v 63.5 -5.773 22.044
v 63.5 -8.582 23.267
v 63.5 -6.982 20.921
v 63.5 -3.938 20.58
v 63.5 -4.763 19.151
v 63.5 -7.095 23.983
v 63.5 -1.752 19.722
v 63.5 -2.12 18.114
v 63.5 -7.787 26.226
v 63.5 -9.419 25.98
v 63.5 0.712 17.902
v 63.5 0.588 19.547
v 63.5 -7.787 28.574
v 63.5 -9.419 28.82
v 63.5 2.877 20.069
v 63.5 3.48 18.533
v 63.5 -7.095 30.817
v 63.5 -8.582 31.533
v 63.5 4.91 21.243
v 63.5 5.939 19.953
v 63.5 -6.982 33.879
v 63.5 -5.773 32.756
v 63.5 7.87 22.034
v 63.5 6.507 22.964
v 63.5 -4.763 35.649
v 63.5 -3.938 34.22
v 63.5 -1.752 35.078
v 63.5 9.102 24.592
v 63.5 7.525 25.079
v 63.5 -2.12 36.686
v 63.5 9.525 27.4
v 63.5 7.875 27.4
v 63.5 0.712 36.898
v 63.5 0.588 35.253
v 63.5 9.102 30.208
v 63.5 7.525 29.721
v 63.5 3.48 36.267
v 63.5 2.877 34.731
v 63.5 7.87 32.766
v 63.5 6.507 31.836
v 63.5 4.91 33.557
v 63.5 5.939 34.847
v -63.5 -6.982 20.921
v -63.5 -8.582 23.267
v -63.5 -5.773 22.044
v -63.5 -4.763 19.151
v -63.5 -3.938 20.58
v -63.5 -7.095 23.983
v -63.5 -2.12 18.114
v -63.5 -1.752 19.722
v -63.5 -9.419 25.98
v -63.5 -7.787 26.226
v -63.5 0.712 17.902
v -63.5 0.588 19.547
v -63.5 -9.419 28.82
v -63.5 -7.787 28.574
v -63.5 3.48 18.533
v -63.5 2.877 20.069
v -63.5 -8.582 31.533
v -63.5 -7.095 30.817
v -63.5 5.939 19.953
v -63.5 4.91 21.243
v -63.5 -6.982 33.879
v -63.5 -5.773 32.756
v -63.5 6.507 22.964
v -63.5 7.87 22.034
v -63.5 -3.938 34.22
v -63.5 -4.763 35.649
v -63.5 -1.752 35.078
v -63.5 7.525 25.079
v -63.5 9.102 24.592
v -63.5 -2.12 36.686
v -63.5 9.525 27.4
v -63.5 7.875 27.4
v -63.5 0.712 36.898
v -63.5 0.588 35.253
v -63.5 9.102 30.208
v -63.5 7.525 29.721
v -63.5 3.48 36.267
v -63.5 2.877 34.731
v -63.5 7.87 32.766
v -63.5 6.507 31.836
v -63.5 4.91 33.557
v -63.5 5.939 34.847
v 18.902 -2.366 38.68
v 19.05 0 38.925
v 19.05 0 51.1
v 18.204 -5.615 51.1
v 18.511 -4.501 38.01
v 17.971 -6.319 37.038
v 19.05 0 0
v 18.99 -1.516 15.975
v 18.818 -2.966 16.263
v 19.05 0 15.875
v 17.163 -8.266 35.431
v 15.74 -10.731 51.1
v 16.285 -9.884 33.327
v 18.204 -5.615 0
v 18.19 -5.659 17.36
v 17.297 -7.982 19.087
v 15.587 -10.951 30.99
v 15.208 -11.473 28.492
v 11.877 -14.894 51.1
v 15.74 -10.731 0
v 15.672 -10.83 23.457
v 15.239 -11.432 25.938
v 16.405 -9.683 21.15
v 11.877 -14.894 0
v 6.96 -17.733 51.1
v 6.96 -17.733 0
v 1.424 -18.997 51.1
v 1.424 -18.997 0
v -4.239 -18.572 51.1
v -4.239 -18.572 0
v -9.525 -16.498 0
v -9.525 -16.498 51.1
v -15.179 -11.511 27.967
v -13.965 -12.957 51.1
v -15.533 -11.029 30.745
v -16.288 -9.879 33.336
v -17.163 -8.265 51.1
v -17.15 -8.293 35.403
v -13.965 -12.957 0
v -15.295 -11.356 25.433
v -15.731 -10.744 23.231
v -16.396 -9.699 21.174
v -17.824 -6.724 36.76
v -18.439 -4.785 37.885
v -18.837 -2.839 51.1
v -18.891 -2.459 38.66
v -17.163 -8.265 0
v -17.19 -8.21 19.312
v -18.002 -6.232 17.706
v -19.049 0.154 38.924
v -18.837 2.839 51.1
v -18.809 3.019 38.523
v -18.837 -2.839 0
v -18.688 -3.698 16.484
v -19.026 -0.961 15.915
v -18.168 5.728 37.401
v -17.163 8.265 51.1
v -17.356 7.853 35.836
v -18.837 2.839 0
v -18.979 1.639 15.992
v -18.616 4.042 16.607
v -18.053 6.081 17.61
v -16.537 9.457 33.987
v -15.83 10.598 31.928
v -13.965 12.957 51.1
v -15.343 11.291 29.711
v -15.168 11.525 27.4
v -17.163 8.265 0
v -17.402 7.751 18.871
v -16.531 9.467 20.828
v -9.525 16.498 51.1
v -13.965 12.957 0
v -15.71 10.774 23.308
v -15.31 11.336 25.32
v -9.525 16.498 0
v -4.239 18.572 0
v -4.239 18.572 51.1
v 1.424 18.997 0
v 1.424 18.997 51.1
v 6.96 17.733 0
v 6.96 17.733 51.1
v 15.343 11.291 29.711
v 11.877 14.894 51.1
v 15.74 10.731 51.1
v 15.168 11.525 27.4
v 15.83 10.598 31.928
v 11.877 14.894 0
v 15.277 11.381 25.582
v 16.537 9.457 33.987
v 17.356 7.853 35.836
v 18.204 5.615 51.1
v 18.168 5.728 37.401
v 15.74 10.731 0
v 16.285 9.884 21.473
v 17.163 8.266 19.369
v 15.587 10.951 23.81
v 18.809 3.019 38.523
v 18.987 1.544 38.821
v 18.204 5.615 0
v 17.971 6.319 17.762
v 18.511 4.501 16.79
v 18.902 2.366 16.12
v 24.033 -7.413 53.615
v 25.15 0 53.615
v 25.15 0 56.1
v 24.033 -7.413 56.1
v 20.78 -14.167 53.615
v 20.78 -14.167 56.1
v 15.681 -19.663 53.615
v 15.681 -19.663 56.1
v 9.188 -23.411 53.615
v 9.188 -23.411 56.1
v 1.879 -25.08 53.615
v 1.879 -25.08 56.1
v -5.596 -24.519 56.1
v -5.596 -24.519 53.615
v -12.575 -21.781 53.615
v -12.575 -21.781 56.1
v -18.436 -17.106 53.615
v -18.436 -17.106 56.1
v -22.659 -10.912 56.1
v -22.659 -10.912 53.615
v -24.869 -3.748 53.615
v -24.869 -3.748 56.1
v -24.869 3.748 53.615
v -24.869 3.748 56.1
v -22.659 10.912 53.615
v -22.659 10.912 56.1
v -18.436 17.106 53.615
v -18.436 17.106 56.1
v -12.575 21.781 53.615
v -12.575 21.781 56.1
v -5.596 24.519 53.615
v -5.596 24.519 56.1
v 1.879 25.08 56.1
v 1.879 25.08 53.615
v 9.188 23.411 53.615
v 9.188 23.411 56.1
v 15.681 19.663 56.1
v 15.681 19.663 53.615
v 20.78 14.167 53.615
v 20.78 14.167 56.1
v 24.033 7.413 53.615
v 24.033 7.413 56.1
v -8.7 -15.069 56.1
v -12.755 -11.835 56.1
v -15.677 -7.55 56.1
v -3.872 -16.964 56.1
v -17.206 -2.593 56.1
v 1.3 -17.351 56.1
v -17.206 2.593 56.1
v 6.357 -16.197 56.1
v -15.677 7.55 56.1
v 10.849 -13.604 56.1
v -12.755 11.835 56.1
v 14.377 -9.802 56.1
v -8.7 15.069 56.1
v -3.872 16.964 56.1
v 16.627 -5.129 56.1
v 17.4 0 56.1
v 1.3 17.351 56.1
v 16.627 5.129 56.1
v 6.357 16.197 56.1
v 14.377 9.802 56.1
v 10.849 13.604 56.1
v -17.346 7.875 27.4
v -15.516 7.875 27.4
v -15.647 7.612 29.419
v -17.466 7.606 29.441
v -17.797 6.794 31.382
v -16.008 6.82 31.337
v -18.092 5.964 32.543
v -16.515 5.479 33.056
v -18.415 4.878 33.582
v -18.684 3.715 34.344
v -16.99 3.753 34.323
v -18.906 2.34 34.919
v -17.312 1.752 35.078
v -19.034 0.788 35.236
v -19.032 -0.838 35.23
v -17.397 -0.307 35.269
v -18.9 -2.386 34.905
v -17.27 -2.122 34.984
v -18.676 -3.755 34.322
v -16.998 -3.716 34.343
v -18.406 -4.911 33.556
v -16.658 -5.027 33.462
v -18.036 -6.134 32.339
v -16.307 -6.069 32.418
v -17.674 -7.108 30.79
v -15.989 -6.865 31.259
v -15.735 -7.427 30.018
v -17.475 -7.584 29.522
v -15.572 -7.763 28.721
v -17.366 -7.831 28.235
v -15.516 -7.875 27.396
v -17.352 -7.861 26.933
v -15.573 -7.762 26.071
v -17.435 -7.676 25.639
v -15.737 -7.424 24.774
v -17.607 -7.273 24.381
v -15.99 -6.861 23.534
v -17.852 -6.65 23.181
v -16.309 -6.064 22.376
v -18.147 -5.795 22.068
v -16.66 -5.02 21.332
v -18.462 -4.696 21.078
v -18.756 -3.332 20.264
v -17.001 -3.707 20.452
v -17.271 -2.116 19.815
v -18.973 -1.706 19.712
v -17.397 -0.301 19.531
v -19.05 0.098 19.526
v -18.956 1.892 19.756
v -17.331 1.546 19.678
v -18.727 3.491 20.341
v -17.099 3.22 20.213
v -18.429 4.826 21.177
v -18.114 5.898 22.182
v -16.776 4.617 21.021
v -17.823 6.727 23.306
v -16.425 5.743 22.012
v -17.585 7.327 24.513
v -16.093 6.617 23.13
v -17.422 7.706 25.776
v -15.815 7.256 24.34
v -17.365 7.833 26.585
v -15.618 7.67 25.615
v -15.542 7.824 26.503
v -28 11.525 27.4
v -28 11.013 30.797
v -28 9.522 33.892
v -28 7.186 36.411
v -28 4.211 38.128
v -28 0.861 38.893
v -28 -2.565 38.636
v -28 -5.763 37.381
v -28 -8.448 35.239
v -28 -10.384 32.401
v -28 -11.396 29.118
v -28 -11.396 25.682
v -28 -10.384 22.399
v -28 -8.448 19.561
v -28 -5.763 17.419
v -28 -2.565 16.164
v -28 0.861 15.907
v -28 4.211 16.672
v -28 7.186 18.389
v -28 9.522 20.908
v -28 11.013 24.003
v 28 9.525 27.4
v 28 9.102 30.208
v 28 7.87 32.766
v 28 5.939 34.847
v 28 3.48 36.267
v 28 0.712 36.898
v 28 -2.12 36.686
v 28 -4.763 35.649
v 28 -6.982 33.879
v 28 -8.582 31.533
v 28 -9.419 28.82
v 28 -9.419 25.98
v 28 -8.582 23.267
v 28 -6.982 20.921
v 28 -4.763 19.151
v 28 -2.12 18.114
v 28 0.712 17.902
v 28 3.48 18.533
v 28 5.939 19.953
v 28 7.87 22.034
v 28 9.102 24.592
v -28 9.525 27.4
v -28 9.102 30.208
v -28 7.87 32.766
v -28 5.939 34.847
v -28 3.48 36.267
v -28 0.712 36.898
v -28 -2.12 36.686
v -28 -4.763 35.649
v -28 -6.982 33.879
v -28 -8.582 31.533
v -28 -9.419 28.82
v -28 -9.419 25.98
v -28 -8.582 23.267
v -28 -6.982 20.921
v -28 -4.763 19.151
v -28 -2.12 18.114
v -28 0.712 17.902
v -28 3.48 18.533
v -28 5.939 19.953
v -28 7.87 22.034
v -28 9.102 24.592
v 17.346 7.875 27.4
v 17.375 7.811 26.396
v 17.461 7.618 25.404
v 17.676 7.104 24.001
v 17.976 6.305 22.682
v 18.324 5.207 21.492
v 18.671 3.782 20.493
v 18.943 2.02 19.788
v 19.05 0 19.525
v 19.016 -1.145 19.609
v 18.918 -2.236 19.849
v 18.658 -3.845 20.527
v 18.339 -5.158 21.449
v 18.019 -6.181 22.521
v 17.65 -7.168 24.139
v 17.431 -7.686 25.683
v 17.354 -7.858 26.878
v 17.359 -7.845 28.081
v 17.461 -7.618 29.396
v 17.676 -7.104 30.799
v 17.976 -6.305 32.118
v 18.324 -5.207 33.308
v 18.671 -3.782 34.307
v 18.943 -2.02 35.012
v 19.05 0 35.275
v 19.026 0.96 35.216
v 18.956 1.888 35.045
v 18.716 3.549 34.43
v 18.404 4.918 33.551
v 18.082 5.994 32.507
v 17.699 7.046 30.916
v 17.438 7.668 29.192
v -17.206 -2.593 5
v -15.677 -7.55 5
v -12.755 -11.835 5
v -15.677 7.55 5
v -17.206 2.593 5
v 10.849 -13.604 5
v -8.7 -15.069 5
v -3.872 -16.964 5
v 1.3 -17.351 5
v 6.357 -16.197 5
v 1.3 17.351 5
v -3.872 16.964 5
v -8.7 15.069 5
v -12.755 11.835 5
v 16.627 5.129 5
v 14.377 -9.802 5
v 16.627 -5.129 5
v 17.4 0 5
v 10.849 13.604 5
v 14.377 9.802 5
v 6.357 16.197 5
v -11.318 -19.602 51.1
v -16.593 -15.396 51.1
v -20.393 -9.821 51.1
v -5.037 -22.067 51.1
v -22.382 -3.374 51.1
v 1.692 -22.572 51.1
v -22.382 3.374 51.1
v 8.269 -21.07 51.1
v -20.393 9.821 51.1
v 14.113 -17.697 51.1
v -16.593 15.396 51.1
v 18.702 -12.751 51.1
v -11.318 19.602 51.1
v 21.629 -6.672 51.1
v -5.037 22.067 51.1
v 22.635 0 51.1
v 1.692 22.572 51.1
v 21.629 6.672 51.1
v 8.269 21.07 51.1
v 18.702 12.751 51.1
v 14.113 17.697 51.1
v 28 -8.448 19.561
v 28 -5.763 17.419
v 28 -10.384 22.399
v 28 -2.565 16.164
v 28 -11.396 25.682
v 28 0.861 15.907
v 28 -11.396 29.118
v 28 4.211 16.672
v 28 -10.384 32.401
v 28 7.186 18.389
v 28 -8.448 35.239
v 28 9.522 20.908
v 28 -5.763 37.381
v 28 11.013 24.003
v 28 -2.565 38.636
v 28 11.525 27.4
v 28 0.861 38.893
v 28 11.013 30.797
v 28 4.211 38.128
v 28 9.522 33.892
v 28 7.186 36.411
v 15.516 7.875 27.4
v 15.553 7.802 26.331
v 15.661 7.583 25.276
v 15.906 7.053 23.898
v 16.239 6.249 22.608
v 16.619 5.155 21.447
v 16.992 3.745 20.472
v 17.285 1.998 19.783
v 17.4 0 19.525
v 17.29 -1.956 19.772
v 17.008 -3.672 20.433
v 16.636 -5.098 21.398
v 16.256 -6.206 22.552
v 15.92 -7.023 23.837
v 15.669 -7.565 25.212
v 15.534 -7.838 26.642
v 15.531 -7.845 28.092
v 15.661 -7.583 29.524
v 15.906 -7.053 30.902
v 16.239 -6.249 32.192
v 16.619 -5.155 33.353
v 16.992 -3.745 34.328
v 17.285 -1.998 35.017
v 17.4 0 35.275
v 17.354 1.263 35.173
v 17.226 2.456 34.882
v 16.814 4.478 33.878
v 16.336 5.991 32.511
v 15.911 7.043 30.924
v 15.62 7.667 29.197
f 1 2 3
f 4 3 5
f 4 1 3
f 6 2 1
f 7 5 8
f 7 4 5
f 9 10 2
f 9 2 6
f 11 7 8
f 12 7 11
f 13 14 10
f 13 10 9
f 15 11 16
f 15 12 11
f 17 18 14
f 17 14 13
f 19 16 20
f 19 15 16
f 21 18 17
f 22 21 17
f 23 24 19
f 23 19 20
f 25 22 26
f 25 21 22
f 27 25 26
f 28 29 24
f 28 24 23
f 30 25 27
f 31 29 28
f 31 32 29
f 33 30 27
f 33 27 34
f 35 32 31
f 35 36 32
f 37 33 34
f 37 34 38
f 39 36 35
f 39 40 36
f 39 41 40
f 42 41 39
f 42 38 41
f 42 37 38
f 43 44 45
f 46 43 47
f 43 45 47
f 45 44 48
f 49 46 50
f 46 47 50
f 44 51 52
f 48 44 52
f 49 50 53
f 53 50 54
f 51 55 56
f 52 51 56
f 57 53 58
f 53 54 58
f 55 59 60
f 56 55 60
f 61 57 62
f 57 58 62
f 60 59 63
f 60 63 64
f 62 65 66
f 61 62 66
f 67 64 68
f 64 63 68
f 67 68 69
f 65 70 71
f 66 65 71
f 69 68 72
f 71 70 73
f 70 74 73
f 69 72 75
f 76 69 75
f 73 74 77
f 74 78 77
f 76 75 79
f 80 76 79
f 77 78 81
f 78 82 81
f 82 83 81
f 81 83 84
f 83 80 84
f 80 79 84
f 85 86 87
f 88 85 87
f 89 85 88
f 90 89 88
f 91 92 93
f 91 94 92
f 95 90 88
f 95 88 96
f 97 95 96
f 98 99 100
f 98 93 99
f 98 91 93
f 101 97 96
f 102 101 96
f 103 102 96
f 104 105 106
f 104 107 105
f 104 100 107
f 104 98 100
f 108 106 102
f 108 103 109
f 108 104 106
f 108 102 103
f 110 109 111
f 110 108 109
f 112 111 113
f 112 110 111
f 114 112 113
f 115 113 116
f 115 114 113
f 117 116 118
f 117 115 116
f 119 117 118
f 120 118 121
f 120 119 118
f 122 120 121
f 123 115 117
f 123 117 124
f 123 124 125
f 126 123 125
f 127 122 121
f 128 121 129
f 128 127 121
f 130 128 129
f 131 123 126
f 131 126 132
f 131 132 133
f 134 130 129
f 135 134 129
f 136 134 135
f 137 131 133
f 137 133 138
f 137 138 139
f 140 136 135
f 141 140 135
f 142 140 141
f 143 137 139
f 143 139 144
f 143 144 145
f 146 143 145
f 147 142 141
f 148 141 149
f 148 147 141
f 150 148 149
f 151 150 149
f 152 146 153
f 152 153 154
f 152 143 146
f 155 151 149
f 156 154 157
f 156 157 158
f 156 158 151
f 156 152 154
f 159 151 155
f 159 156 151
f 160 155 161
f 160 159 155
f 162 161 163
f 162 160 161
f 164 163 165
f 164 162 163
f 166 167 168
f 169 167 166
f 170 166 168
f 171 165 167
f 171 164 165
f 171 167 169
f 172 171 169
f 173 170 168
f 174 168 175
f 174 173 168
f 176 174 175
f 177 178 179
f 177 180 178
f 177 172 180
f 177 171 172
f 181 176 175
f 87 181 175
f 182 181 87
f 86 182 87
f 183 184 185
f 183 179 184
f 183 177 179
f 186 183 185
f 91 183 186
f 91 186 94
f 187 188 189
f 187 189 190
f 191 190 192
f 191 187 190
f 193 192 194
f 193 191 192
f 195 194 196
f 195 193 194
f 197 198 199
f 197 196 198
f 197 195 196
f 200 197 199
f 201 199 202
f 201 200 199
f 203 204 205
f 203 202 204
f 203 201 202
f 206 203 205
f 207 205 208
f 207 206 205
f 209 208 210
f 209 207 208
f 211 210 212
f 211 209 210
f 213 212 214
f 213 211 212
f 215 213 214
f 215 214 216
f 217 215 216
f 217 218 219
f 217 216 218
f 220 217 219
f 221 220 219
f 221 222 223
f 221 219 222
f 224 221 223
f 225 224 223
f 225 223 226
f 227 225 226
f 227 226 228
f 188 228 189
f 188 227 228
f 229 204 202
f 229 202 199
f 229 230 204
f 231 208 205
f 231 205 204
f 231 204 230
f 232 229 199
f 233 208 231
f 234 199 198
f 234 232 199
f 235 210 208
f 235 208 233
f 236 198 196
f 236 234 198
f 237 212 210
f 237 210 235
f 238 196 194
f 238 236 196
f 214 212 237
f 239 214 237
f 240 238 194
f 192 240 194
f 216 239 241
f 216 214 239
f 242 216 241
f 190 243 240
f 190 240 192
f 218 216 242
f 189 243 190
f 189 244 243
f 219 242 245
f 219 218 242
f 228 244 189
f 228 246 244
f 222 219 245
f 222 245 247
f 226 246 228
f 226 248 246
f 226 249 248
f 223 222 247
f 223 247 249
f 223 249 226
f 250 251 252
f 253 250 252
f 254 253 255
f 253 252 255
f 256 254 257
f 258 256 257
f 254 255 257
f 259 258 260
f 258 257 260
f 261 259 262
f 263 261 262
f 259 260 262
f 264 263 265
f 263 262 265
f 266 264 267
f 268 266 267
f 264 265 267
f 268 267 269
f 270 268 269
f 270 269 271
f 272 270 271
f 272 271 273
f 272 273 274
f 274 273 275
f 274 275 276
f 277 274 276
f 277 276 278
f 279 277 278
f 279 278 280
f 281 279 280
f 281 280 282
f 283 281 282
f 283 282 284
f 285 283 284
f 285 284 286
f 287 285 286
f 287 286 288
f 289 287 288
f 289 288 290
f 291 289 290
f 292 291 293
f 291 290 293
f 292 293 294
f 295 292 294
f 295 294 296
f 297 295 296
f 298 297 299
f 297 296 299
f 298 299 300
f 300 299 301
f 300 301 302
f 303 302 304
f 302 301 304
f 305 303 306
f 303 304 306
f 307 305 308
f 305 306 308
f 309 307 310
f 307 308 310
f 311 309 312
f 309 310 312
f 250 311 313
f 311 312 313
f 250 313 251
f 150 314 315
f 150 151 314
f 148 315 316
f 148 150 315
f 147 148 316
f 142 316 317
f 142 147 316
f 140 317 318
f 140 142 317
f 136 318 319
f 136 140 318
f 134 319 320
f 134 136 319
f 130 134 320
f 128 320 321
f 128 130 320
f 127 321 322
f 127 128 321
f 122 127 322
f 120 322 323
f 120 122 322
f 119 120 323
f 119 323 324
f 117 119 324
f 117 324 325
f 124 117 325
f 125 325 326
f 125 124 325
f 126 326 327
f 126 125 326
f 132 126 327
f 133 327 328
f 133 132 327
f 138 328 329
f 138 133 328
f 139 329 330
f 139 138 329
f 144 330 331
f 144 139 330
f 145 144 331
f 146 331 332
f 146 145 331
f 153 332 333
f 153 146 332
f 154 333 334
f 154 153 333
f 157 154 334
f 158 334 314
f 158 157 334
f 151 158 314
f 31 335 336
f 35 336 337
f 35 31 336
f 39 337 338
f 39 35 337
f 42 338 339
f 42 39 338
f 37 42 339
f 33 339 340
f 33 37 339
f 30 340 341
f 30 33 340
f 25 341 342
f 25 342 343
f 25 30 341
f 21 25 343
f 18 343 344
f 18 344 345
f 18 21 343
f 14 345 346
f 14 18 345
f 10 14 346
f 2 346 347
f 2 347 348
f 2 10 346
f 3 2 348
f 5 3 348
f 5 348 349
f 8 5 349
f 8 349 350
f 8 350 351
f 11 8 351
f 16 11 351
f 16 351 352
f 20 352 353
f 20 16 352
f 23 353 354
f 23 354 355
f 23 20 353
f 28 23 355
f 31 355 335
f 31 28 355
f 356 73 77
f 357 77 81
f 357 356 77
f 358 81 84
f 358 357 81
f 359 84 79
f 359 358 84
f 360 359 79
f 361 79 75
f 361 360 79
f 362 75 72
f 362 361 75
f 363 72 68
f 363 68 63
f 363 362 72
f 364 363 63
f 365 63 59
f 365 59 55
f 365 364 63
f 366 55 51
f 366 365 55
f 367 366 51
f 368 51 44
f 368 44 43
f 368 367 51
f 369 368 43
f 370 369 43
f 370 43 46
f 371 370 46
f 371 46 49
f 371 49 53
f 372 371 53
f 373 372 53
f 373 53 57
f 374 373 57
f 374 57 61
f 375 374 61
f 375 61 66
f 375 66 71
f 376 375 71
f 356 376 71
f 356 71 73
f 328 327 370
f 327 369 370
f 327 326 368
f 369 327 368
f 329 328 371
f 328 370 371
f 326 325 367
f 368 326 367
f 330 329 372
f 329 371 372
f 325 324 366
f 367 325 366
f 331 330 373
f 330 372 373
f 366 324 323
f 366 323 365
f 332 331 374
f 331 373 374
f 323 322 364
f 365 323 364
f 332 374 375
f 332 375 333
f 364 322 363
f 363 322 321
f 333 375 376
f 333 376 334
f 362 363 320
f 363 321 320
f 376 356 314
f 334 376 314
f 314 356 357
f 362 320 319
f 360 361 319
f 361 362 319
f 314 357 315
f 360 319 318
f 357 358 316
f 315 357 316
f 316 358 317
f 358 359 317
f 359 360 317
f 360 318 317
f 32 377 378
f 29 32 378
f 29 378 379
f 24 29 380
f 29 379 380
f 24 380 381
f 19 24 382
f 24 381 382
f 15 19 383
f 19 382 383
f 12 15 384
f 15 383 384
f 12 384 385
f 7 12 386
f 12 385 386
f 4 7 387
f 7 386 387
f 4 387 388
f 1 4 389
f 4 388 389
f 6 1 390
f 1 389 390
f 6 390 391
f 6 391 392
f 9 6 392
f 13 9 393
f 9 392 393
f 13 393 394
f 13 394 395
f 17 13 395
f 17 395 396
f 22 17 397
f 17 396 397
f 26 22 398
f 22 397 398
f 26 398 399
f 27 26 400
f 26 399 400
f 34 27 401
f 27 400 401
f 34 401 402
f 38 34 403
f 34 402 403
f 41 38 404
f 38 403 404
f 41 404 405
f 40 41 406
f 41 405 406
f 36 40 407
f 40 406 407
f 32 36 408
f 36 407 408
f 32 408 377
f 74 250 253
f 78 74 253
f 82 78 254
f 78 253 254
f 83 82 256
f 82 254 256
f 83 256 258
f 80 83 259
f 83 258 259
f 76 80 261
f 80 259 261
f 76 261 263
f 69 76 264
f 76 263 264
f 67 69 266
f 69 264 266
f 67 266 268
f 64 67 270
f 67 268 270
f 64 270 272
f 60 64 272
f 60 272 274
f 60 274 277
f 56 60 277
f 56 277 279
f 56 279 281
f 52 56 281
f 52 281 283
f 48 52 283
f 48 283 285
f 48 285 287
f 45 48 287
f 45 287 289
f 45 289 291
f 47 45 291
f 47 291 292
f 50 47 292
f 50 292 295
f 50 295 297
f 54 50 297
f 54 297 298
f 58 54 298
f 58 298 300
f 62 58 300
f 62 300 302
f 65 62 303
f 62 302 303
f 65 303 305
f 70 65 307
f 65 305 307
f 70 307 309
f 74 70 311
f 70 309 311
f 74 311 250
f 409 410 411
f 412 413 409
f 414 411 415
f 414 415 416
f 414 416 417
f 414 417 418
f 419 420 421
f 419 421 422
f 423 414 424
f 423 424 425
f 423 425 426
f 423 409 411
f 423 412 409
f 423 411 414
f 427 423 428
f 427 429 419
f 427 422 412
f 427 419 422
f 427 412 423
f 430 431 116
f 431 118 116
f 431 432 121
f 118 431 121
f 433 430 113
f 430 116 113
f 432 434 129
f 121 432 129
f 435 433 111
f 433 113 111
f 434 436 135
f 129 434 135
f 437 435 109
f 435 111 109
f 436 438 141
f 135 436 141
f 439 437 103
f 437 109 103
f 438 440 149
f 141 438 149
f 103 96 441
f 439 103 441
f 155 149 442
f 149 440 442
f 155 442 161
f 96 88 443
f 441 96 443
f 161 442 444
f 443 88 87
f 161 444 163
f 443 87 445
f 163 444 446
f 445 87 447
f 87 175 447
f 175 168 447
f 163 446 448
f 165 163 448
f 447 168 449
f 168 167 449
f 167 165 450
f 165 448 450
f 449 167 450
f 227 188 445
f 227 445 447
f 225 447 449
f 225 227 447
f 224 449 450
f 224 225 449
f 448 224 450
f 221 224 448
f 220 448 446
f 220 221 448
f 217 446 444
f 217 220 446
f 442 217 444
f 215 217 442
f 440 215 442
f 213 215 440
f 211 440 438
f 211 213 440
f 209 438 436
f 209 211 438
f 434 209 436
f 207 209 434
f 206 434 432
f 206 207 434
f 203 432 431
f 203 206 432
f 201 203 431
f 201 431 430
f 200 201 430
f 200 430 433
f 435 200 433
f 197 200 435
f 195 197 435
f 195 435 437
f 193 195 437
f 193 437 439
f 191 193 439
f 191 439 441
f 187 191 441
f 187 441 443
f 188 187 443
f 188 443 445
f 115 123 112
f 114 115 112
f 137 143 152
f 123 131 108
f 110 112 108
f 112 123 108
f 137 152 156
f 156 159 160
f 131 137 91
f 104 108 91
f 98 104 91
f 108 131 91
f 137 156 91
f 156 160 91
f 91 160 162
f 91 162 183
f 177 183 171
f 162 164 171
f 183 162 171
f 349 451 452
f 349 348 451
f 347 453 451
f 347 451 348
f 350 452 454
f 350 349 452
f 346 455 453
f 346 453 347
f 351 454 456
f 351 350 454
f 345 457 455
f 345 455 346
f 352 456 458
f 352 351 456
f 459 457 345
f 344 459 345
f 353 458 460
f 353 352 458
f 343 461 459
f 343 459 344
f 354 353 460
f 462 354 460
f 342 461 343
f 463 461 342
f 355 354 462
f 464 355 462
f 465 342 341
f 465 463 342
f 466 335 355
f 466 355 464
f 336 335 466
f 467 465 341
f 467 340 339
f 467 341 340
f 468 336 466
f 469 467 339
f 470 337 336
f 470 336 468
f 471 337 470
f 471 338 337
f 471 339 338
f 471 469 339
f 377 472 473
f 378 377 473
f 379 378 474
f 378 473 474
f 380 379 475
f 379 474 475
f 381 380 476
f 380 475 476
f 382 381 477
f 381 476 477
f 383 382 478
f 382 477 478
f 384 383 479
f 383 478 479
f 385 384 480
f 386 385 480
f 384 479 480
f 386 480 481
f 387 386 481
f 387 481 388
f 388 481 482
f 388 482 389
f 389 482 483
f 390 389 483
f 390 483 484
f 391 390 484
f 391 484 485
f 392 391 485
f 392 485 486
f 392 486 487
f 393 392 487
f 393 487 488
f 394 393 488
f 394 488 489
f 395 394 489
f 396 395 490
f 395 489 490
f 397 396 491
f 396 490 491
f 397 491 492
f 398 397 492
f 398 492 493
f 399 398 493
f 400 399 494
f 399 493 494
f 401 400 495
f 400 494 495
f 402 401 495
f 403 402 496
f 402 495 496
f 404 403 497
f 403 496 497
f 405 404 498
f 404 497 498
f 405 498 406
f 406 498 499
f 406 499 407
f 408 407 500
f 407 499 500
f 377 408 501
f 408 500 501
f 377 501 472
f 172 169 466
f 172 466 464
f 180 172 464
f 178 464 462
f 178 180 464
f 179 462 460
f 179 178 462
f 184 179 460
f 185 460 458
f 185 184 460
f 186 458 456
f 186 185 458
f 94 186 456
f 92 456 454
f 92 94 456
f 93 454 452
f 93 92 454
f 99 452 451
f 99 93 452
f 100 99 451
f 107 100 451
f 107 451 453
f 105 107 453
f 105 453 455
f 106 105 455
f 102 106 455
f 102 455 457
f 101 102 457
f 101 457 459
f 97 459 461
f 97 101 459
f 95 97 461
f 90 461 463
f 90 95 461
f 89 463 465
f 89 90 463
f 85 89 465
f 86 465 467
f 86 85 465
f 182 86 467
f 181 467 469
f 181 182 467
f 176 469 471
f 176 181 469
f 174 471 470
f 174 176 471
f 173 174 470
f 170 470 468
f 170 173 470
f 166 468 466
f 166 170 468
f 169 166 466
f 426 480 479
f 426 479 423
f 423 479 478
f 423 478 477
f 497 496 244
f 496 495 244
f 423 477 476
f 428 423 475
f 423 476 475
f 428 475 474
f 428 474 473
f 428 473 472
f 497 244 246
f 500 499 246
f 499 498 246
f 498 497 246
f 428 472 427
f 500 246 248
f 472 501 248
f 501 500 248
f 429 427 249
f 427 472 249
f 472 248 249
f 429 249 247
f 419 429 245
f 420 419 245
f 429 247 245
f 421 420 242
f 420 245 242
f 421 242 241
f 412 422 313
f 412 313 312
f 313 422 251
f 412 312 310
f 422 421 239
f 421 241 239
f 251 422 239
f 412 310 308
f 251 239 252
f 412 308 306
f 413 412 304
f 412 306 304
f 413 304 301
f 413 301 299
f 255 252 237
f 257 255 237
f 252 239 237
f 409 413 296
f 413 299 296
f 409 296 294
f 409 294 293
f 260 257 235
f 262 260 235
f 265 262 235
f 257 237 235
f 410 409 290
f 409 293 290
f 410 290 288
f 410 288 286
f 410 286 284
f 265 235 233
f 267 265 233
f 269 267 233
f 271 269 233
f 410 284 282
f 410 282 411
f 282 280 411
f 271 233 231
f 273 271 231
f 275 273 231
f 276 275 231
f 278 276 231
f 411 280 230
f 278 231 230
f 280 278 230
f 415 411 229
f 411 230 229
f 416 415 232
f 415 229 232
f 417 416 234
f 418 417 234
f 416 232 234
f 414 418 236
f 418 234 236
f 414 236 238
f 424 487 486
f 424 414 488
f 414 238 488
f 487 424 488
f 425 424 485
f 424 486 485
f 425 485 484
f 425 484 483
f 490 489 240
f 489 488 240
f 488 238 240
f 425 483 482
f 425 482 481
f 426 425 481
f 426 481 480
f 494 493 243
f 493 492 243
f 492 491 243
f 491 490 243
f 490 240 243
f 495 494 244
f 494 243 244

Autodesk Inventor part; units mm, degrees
ref_plane "YZ Plane" through (0, 0, 0) normal (1, 0, 0) x (0, 1, 0)
ref_plane "XZ Plane" through (0, 0, 0) normal (0, 1, 0) x (-1, 0, 0)
ref_plane "XY Plane" through (0, 0, 0) normal (0, 0, 1) x (1, 0, 0)
sketch "Sketch1" plane through (0, 0, 0) normal (0, 0, 1) x (1, 0, 0)
  circle A0 centre (0, 0) radius 19.05
  dimension "d0" = 38.1
extrude "Extrusion1" add sketch "Sketch1" along normal blind 51.1
sketch "Sketch6" plane through (0, 0, 0) normal (1, 0, 0) x (0, 1, 0)
  line L0 (0, 0) -> (0, 27.4) construction
  circle A0 centre (0, 27.4) radius 9.525
  circle A1 centre (0, 27.4) radius 7.875
  dimension "d22" = 27.4
  dimension "d23" = 19.05
  dimension "d24" = 15.75
extrude "Extrusion6" add sketch "Sketch6" against normal mid plane 127
sketch "Sketch7" plane through (0, 0, 0) normal (1, 0, 0) x (0, 1, 0)
  circle A0 centre (0, 27.4) radius 11.525
  circle A1 centre (0, 27.4) radius 9.525 projected
  dimension "d67" = 2
extrude "Extrusion7" add sketch "Sketch7" along normal mid plane 56
sketch "Sketch13" plane through (0, 0, 51.1) normal (0, 0, 1) x (1, 0, 0)
  circle A0 centre (0, 0) radius 25.15
  circle A1 centre (0, 0) radius 19.05 construction
  dimension "d60" = 50.3
extrude "Extrusion12" add sketch "Sketch13" along normal blind 5
chamfer "Chamfer1" distance 2.515 angle 45 1 edges at (-25.15, 0, 51.1)
sketch "Sketch14" plane through (0, 0, 56.1) normal (0, 0, 1) x (1, 0, 0)
  circle A0 centre (0, 0) radius 17.4
  circle A1 centre (0, 0) radius 19.05 construction
  dimension "d68" = 1.65
extrude "Extrusion13" cut sketch "Sketch14" against normal blind 51.1
sketch "Sketch15" plane through (0, 0, 0) normal (1, 0, 0) x (0, 1, 0)
  circle A0 centre (0, 27.4) radius 7.875 projected
extrude "Extrusion14" cut sketch "Sketch15" along normal through all both and the other way through all
equation "\"d25\" = 2 * d21"
equation "\"d64\" = 0.05 * d60"
equation "\"d69\" = d1"
equation "\"d21\" = 63.5"
equation "\"d1\" = 51.1"
properties part number "3/4\" DT28" material "Stainless Steel, 316L"
